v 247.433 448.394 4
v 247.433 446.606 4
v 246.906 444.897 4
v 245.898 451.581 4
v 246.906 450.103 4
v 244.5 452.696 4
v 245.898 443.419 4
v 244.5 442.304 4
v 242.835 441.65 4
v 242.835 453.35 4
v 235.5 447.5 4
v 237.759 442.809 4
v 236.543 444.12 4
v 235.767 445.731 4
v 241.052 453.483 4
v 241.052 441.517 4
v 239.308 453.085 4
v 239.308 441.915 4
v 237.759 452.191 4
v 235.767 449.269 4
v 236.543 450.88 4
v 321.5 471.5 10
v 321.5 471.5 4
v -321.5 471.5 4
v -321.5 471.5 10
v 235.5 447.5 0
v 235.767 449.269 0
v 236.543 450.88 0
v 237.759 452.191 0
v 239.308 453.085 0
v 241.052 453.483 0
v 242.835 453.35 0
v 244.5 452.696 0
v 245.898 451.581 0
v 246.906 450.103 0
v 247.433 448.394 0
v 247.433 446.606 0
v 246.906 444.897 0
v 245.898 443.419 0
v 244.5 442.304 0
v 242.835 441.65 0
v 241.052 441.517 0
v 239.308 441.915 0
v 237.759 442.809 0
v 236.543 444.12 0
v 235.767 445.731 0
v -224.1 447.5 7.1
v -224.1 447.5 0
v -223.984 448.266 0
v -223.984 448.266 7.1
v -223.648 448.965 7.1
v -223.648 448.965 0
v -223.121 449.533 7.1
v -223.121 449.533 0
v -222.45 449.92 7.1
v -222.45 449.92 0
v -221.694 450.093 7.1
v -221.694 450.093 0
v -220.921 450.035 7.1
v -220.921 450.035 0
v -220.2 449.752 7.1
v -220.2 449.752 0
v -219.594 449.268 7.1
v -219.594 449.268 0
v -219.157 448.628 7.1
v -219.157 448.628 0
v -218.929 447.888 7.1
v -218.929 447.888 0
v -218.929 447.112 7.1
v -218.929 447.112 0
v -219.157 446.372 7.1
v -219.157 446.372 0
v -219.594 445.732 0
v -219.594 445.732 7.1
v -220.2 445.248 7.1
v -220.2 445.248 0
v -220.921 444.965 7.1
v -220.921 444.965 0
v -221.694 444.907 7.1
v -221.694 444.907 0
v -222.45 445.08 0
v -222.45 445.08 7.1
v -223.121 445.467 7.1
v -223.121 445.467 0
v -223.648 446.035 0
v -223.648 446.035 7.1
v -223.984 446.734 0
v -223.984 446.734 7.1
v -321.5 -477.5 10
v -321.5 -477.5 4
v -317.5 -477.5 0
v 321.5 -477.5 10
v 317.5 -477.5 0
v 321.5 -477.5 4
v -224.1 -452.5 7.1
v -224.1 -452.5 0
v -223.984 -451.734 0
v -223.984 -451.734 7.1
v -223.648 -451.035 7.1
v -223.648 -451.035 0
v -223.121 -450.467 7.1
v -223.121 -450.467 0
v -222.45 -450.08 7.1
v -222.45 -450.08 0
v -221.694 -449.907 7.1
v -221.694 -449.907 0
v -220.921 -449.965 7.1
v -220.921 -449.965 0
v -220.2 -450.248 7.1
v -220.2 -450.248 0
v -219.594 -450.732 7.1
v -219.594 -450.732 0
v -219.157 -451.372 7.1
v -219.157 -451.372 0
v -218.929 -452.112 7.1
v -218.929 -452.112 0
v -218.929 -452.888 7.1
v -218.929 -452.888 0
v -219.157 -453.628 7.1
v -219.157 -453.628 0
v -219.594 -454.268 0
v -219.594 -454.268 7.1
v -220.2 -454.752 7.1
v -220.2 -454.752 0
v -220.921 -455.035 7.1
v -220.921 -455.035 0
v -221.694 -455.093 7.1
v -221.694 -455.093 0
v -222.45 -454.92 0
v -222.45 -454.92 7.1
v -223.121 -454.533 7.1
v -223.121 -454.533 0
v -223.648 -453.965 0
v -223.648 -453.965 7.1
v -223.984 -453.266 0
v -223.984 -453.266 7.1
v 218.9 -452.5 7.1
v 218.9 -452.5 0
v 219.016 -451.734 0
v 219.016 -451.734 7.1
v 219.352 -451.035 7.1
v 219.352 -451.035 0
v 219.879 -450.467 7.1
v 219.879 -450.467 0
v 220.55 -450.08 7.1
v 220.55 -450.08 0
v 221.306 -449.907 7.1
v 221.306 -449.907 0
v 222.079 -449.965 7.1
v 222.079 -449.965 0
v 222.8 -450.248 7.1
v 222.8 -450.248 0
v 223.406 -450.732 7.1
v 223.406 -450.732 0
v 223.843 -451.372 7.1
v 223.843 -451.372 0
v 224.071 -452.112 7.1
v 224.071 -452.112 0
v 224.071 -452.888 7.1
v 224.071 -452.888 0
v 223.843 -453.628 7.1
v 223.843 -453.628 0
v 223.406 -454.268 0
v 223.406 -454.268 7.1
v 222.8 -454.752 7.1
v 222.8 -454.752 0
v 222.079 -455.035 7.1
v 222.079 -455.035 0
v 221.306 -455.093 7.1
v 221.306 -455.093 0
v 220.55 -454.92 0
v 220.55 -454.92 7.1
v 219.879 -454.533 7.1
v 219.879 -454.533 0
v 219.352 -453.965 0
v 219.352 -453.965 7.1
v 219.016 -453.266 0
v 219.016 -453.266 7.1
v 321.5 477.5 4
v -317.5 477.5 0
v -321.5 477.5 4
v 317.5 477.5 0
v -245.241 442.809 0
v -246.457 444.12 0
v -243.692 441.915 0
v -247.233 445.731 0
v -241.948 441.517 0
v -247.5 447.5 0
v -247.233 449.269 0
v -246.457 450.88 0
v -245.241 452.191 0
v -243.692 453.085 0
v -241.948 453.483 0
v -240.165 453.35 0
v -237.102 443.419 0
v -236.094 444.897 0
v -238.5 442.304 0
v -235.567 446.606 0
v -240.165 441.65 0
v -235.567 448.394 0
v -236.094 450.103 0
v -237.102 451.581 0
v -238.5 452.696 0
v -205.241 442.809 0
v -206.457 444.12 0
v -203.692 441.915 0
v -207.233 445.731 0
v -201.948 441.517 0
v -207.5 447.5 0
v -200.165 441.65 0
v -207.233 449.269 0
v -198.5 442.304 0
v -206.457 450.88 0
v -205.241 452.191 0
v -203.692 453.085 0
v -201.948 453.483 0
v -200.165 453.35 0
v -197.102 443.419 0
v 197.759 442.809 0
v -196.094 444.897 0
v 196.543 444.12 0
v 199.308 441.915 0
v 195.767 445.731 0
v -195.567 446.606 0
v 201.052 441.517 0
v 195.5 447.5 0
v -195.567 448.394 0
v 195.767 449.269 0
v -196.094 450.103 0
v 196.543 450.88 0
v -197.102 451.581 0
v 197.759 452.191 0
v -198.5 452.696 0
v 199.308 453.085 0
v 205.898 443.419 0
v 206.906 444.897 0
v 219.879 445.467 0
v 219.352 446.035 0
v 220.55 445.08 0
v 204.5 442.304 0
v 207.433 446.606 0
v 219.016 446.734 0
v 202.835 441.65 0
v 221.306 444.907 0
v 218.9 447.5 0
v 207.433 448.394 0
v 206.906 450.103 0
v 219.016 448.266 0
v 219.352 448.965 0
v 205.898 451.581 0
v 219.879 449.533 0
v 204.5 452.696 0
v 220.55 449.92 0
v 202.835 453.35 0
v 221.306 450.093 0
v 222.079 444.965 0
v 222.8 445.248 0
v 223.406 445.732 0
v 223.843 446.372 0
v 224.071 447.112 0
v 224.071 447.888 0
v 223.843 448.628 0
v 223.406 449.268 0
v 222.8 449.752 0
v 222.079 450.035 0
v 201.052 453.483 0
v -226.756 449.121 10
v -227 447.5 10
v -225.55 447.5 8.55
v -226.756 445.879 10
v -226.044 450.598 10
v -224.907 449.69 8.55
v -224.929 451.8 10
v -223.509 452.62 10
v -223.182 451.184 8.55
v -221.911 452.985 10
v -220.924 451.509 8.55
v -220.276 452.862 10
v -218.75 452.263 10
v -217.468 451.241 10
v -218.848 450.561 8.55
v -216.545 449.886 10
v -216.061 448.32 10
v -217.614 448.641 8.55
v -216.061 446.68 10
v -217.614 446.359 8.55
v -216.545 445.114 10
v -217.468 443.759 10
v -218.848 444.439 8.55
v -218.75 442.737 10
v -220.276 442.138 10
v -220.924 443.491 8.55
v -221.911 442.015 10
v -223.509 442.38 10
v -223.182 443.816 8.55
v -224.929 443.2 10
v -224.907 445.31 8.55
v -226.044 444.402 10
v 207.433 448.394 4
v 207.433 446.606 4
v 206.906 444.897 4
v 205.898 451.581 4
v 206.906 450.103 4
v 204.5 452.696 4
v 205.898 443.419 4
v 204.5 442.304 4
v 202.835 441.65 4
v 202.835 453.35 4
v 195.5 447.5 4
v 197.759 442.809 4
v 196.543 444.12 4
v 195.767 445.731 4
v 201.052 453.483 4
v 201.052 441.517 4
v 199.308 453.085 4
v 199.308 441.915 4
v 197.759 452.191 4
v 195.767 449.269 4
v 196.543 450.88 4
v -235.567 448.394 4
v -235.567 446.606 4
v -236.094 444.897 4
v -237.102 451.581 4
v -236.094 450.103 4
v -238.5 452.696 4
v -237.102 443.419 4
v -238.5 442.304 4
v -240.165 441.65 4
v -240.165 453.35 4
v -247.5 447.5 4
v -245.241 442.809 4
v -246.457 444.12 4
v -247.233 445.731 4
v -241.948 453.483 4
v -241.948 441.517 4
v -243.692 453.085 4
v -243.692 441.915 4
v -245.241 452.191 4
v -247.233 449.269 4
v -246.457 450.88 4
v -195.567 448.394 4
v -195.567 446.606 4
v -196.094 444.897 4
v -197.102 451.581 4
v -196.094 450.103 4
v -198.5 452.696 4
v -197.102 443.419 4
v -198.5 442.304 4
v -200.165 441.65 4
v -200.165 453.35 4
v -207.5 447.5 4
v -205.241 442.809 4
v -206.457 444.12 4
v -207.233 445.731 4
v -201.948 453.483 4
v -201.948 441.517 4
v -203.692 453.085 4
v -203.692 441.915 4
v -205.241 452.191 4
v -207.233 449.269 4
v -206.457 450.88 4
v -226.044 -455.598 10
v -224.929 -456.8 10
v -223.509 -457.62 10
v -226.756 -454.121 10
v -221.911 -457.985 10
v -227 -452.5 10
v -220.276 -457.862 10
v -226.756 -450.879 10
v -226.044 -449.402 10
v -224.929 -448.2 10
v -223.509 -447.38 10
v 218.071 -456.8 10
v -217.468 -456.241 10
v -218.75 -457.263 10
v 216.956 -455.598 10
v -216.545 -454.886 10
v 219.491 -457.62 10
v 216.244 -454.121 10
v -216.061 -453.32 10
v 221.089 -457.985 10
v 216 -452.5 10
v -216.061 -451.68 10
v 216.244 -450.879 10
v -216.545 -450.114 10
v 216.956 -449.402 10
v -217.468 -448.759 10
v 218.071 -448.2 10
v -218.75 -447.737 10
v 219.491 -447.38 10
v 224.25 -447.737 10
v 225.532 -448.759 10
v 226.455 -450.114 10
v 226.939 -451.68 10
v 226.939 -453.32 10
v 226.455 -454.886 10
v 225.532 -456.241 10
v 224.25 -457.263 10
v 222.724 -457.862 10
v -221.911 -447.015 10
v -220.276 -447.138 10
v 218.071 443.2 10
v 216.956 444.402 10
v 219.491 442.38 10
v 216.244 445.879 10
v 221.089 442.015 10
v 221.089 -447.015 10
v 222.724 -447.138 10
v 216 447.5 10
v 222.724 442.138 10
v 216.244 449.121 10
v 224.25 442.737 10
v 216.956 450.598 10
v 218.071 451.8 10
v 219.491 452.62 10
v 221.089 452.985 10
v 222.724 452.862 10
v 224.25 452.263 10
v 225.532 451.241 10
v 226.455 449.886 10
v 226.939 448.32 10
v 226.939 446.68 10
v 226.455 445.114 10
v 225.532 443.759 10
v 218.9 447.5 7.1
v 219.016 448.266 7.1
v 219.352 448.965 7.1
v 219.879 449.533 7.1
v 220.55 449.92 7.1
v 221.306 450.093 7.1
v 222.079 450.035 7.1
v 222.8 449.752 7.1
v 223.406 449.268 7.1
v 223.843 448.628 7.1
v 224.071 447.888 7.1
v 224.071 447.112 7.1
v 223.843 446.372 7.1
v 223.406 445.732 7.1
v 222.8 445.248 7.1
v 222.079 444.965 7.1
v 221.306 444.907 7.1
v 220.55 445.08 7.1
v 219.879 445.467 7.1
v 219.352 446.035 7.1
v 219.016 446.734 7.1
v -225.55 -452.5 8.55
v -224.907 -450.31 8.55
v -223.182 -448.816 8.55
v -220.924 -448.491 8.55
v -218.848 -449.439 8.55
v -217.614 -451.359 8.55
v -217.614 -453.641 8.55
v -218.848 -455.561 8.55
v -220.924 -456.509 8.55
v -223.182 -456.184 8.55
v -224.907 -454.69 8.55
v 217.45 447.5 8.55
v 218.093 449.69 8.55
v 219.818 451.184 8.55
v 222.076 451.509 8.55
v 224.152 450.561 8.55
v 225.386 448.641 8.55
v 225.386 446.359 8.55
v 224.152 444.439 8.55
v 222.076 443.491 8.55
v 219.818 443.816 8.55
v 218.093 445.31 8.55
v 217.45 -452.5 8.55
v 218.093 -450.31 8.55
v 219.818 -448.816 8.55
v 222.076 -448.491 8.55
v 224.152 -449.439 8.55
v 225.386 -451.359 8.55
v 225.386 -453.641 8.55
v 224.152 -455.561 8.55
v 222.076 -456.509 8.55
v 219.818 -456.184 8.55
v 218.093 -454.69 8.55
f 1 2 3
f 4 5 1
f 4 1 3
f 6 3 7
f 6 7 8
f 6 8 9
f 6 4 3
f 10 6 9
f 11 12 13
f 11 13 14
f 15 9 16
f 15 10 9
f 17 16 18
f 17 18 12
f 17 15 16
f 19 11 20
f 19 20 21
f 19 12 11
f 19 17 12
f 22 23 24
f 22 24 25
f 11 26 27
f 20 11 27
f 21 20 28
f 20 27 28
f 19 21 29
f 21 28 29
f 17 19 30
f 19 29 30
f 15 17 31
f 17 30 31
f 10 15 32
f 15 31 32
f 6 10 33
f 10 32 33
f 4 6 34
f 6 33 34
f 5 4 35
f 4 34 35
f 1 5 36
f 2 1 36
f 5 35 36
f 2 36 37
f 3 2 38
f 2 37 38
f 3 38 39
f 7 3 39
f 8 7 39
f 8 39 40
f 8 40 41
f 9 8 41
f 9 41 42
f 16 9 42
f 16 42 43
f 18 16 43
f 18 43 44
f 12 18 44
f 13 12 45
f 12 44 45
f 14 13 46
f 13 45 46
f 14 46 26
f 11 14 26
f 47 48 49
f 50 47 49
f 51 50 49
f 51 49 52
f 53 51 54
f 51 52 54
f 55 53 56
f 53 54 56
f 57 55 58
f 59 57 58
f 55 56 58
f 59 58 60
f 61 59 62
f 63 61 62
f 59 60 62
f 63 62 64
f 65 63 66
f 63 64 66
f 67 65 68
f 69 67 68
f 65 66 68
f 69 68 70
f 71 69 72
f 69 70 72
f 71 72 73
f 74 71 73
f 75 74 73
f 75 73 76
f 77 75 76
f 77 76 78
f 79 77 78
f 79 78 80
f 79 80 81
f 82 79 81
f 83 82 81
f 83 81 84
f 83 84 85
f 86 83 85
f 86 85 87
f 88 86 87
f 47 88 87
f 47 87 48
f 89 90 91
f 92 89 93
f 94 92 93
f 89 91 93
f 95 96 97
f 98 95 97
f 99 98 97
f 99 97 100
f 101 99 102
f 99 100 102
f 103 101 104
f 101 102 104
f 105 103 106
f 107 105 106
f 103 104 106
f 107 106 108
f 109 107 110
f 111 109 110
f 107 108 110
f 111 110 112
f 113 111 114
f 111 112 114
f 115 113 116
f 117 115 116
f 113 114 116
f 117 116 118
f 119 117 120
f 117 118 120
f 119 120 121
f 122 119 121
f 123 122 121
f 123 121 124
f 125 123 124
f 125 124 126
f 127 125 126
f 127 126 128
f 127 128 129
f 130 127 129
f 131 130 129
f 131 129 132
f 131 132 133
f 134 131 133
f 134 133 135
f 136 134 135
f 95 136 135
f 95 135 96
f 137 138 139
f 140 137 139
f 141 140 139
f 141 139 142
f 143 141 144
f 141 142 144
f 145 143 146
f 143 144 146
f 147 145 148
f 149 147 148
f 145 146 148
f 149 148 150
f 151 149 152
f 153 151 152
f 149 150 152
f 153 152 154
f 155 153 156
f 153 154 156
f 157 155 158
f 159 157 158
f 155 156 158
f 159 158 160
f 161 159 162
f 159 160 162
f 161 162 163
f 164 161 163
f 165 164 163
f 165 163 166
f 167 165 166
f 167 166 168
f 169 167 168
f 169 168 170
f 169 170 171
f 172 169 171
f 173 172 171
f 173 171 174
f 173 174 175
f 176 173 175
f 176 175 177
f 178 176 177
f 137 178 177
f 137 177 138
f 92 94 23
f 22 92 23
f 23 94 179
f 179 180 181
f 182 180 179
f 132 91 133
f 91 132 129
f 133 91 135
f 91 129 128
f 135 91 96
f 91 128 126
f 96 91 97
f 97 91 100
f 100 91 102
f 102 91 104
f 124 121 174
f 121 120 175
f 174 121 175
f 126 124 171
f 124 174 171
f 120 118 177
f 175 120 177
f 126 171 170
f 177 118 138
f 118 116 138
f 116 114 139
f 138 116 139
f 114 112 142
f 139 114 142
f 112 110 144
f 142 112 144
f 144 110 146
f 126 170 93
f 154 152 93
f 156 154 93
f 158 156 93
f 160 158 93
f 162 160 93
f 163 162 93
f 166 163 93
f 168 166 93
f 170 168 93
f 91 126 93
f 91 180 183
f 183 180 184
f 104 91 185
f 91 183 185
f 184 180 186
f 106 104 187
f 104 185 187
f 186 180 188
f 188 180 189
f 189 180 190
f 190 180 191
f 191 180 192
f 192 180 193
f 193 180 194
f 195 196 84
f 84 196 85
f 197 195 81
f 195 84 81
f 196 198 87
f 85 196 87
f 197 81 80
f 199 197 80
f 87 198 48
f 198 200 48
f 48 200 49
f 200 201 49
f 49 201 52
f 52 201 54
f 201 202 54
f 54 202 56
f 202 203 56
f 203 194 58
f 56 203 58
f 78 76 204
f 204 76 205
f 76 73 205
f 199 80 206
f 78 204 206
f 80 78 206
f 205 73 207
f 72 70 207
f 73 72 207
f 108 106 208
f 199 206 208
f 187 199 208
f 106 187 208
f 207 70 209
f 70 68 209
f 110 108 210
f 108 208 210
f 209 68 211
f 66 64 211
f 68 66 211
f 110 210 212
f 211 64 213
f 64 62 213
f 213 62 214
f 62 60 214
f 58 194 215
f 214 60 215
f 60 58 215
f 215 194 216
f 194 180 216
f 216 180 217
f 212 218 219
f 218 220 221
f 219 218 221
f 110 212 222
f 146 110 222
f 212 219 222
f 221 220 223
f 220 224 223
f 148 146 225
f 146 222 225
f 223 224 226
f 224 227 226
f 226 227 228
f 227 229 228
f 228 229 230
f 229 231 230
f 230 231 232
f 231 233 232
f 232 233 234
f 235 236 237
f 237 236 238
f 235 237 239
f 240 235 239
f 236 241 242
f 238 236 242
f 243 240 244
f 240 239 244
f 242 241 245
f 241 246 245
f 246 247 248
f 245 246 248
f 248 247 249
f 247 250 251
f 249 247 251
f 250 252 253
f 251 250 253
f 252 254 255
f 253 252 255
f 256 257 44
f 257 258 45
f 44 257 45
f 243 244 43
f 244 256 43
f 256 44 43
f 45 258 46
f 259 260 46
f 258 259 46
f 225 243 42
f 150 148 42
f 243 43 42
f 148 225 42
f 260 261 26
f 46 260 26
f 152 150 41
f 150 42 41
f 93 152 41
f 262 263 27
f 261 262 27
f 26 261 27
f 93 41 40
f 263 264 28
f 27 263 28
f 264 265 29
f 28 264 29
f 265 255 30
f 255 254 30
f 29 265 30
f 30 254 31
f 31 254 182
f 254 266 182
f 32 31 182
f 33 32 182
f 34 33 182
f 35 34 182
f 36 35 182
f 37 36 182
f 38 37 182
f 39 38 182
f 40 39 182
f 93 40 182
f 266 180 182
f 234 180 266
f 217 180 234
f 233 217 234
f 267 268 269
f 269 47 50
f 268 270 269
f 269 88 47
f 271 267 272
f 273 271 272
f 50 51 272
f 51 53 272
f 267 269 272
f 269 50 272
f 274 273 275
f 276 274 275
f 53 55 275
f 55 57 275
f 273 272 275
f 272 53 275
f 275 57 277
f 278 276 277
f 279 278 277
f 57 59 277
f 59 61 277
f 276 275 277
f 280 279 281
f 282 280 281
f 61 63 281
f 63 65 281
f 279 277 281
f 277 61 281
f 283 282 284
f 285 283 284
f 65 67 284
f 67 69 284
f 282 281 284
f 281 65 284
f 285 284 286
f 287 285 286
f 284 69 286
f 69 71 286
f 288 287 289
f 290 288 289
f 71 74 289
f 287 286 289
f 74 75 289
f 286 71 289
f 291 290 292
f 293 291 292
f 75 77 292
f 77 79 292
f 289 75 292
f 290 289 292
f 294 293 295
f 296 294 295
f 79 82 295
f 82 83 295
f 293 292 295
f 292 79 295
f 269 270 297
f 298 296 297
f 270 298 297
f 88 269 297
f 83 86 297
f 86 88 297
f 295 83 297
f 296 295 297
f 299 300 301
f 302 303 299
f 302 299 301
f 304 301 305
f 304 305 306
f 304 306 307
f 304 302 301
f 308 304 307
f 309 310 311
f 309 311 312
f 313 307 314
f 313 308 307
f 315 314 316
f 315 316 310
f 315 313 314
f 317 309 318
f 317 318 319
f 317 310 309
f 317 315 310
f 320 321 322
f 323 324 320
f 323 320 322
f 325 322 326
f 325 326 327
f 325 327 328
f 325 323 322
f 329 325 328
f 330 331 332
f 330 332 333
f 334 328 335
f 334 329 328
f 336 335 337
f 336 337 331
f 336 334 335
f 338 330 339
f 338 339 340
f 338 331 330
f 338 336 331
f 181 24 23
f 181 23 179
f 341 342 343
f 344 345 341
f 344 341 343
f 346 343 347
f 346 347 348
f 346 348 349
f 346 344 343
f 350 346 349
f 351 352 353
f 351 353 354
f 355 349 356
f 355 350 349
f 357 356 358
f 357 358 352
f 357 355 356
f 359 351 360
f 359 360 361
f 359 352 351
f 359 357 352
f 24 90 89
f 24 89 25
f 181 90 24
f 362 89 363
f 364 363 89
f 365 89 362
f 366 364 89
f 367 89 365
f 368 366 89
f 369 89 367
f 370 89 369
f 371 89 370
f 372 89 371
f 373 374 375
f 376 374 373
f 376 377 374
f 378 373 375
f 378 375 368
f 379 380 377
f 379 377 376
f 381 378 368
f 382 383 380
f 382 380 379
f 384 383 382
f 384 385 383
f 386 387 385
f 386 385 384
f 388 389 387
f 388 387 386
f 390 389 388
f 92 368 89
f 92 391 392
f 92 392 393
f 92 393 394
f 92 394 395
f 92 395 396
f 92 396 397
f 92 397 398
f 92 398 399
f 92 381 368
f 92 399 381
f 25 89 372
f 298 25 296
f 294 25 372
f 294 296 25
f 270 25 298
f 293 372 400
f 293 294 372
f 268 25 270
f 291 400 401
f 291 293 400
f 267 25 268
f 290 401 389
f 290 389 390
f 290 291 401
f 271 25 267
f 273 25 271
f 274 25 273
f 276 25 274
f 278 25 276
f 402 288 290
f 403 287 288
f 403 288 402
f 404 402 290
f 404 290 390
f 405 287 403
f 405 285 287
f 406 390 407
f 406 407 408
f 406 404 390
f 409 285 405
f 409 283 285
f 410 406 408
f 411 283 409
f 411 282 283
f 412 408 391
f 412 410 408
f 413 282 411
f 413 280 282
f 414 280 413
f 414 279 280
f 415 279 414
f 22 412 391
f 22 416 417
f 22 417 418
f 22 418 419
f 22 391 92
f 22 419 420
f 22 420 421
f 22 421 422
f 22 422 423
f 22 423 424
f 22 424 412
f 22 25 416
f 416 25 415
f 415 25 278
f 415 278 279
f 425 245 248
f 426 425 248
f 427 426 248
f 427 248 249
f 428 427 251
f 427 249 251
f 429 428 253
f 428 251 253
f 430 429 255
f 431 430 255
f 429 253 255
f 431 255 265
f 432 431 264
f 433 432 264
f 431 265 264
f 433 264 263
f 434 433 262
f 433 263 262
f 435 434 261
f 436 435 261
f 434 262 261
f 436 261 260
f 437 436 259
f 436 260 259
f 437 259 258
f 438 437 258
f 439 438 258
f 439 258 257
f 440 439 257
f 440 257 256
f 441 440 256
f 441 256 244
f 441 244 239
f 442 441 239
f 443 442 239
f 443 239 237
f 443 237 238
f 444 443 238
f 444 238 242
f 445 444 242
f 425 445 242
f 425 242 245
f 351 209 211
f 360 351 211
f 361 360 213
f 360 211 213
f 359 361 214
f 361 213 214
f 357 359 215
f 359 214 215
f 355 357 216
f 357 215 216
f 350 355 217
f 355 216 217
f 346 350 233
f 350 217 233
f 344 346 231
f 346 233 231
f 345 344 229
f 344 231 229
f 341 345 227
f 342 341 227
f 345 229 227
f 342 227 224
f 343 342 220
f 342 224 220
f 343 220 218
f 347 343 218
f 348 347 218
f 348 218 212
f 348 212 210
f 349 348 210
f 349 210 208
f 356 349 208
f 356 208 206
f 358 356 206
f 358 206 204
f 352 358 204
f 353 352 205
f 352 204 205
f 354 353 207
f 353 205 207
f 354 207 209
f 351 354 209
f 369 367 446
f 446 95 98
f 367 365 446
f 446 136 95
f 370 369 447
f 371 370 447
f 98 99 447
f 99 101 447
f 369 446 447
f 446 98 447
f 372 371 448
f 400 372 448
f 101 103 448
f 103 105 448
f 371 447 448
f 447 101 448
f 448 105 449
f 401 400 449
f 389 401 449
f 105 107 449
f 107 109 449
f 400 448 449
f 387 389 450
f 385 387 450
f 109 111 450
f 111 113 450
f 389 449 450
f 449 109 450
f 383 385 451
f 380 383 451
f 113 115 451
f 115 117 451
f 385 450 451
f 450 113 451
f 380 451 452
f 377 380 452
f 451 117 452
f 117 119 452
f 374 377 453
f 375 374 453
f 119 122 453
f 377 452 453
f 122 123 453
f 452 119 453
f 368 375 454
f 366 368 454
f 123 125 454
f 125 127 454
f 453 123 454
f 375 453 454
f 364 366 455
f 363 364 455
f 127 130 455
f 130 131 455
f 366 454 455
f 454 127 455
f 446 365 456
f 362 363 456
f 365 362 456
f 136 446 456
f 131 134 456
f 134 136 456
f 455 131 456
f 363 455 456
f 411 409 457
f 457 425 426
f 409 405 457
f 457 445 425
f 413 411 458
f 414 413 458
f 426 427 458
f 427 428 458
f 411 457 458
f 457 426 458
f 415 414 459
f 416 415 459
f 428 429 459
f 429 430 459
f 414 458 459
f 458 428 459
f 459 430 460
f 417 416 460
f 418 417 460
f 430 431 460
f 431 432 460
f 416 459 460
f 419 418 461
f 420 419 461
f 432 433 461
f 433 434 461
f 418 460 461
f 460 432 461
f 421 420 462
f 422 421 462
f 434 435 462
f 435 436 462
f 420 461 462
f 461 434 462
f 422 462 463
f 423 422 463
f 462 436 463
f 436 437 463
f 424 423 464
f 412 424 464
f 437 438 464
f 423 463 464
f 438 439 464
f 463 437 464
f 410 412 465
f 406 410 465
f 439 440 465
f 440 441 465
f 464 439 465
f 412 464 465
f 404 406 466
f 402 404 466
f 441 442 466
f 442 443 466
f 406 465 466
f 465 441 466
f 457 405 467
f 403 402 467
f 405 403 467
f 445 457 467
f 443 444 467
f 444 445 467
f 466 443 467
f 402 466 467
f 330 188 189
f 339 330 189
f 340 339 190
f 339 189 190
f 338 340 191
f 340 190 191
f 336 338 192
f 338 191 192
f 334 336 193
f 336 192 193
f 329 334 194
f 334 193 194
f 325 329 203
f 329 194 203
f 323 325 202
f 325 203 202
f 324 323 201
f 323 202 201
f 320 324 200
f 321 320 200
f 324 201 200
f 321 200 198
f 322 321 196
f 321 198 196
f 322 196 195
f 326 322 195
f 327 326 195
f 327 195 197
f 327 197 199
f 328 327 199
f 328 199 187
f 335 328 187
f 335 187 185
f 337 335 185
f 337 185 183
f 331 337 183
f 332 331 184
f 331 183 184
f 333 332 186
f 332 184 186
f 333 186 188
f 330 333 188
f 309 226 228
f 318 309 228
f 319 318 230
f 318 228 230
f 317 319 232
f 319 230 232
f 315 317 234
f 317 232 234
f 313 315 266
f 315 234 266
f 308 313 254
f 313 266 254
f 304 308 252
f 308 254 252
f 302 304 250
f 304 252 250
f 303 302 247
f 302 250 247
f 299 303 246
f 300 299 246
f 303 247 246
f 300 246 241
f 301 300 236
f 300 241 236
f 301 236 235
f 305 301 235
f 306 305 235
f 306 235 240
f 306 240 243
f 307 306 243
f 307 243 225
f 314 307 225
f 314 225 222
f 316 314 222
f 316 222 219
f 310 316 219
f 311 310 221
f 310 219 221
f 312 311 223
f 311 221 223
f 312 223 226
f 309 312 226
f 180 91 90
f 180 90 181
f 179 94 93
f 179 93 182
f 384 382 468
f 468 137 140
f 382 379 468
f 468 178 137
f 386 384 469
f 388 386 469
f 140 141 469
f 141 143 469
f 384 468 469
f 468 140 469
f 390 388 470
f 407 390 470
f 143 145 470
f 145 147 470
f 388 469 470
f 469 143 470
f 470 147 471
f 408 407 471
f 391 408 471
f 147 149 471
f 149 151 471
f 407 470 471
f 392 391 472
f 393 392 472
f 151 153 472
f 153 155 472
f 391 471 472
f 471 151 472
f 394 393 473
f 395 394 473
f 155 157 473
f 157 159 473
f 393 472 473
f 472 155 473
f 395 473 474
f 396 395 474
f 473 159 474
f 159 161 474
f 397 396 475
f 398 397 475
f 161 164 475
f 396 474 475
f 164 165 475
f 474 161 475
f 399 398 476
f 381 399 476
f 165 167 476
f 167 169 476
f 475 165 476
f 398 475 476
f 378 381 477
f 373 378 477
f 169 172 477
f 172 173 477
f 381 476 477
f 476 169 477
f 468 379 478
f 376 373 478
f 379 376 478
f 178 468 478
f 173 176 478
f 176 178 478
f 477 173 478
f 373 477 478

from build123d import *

# Parameters (mm, degrees)
SKETCH1_W           = 643
SKETCH1_H           = 955
BOSS_EXTRUDE1_DEPTH = 10
SKETCH2_W           = 6
SKETCH2_H           = 6
CUT_EXTRUDE1_DEPTH  = 801.971441438
CHAMFER1_SIZE       = 4
SKETCH3_R           = 2.6
CUT_EXTRUDE2_DEPTH  = 576.733011039
CHAMFER2_SIZE       = 2.9
SKETCH4_R           = 6
CUT_EXTRUDE3_DEPTH  = 4


with BuildPart() as part:
    # Sketch1 → Boss-Extrude1 (new body)
    with BuildSketch(Plane.XY):
        Rectangle(SKETCH1_W, SKETCH1_H)
    extrude(amount=BOSS_EXTRUDE1_DEPTH)

    # Sketch2 → Cut-Extrude1 (cut, through all)
    with BuildSketch(Plane.ZY.offset(321.5)):
        with Locations((7, 474.5)):
            Rectangle(SKETCH2_W, SKETCH2_H)
    extrude(amount=-CUT_EXTRUDE1_DEPTH, mode=Mode.SUBTRACT)

    # Chamfer1
    chamfer1_edges = [part.edges().sort_by_distance(p)[0] for p in [
        (321.5, 0, 0),
        (-321.5, 0, 0),
    ]]
    chamfer(chamfer1_edges, length=CHAMFER1_SIZE - 0.0001)  # a hair under: the kernel refuses the full size

    # Sketch3 → Cut-Extrude2 (cut, through all)
    with BuildSketch(Plane(origin=(0, 0, 0), x_dir=(-1, 0, 0), z_dir=(0, 0, -1))):
        with Locations((-221.5, -452.5)):
            Circle(SKETCH3_R)
        with Locations((221.5, -452.5)):
            Circle(SKETCH3_R)
        with Locations((221.5, 447.5)):
            Circle(SKETCH3_R)
        with Locations((-221.5, 447.5)):
            Circle(SKETCH3_R)
    extrude(amount=-CUT_EXTRUDE2_DEPTH, mode=Mode.SUBTRACT)

    # Chamfer2
    chamfer2_edges = [part.edges().sort_by_distance(p)[0] for p in [
        (224.1, -452.5, 10),
        (-218.9, -452.5, 10),
        (-218.9, 447.5, 10),
        (224.1, 447.5, 10),
    ]]
    chamfer(chamfer2_edges, length=CHAMFER2_SIZE)

    # Sketch4 → Cut-Extrude3 (cut)
    with BuildSketch(Plane(origin=(0, 0, 0), x_dir=(-1, 0, 0), z_dir=(0, 0, -1))):
        with Locations((-241.5, 447.5)):
            Circle(SKETCH4_R)
        with Locations((-201.5, 447.5)):
            Circle(SKETCH4_R)
        with Locations((201.5, 447.5)):
            Circle(SKETCH4_R)
        with Locations((241.5, 447.5)):
            Circle(SKETCH4_R)
    extrude(amount=-CUT_EXTRUDE3_DEPTH, mode=Mode.SUBTRACT)


solid = part.part
